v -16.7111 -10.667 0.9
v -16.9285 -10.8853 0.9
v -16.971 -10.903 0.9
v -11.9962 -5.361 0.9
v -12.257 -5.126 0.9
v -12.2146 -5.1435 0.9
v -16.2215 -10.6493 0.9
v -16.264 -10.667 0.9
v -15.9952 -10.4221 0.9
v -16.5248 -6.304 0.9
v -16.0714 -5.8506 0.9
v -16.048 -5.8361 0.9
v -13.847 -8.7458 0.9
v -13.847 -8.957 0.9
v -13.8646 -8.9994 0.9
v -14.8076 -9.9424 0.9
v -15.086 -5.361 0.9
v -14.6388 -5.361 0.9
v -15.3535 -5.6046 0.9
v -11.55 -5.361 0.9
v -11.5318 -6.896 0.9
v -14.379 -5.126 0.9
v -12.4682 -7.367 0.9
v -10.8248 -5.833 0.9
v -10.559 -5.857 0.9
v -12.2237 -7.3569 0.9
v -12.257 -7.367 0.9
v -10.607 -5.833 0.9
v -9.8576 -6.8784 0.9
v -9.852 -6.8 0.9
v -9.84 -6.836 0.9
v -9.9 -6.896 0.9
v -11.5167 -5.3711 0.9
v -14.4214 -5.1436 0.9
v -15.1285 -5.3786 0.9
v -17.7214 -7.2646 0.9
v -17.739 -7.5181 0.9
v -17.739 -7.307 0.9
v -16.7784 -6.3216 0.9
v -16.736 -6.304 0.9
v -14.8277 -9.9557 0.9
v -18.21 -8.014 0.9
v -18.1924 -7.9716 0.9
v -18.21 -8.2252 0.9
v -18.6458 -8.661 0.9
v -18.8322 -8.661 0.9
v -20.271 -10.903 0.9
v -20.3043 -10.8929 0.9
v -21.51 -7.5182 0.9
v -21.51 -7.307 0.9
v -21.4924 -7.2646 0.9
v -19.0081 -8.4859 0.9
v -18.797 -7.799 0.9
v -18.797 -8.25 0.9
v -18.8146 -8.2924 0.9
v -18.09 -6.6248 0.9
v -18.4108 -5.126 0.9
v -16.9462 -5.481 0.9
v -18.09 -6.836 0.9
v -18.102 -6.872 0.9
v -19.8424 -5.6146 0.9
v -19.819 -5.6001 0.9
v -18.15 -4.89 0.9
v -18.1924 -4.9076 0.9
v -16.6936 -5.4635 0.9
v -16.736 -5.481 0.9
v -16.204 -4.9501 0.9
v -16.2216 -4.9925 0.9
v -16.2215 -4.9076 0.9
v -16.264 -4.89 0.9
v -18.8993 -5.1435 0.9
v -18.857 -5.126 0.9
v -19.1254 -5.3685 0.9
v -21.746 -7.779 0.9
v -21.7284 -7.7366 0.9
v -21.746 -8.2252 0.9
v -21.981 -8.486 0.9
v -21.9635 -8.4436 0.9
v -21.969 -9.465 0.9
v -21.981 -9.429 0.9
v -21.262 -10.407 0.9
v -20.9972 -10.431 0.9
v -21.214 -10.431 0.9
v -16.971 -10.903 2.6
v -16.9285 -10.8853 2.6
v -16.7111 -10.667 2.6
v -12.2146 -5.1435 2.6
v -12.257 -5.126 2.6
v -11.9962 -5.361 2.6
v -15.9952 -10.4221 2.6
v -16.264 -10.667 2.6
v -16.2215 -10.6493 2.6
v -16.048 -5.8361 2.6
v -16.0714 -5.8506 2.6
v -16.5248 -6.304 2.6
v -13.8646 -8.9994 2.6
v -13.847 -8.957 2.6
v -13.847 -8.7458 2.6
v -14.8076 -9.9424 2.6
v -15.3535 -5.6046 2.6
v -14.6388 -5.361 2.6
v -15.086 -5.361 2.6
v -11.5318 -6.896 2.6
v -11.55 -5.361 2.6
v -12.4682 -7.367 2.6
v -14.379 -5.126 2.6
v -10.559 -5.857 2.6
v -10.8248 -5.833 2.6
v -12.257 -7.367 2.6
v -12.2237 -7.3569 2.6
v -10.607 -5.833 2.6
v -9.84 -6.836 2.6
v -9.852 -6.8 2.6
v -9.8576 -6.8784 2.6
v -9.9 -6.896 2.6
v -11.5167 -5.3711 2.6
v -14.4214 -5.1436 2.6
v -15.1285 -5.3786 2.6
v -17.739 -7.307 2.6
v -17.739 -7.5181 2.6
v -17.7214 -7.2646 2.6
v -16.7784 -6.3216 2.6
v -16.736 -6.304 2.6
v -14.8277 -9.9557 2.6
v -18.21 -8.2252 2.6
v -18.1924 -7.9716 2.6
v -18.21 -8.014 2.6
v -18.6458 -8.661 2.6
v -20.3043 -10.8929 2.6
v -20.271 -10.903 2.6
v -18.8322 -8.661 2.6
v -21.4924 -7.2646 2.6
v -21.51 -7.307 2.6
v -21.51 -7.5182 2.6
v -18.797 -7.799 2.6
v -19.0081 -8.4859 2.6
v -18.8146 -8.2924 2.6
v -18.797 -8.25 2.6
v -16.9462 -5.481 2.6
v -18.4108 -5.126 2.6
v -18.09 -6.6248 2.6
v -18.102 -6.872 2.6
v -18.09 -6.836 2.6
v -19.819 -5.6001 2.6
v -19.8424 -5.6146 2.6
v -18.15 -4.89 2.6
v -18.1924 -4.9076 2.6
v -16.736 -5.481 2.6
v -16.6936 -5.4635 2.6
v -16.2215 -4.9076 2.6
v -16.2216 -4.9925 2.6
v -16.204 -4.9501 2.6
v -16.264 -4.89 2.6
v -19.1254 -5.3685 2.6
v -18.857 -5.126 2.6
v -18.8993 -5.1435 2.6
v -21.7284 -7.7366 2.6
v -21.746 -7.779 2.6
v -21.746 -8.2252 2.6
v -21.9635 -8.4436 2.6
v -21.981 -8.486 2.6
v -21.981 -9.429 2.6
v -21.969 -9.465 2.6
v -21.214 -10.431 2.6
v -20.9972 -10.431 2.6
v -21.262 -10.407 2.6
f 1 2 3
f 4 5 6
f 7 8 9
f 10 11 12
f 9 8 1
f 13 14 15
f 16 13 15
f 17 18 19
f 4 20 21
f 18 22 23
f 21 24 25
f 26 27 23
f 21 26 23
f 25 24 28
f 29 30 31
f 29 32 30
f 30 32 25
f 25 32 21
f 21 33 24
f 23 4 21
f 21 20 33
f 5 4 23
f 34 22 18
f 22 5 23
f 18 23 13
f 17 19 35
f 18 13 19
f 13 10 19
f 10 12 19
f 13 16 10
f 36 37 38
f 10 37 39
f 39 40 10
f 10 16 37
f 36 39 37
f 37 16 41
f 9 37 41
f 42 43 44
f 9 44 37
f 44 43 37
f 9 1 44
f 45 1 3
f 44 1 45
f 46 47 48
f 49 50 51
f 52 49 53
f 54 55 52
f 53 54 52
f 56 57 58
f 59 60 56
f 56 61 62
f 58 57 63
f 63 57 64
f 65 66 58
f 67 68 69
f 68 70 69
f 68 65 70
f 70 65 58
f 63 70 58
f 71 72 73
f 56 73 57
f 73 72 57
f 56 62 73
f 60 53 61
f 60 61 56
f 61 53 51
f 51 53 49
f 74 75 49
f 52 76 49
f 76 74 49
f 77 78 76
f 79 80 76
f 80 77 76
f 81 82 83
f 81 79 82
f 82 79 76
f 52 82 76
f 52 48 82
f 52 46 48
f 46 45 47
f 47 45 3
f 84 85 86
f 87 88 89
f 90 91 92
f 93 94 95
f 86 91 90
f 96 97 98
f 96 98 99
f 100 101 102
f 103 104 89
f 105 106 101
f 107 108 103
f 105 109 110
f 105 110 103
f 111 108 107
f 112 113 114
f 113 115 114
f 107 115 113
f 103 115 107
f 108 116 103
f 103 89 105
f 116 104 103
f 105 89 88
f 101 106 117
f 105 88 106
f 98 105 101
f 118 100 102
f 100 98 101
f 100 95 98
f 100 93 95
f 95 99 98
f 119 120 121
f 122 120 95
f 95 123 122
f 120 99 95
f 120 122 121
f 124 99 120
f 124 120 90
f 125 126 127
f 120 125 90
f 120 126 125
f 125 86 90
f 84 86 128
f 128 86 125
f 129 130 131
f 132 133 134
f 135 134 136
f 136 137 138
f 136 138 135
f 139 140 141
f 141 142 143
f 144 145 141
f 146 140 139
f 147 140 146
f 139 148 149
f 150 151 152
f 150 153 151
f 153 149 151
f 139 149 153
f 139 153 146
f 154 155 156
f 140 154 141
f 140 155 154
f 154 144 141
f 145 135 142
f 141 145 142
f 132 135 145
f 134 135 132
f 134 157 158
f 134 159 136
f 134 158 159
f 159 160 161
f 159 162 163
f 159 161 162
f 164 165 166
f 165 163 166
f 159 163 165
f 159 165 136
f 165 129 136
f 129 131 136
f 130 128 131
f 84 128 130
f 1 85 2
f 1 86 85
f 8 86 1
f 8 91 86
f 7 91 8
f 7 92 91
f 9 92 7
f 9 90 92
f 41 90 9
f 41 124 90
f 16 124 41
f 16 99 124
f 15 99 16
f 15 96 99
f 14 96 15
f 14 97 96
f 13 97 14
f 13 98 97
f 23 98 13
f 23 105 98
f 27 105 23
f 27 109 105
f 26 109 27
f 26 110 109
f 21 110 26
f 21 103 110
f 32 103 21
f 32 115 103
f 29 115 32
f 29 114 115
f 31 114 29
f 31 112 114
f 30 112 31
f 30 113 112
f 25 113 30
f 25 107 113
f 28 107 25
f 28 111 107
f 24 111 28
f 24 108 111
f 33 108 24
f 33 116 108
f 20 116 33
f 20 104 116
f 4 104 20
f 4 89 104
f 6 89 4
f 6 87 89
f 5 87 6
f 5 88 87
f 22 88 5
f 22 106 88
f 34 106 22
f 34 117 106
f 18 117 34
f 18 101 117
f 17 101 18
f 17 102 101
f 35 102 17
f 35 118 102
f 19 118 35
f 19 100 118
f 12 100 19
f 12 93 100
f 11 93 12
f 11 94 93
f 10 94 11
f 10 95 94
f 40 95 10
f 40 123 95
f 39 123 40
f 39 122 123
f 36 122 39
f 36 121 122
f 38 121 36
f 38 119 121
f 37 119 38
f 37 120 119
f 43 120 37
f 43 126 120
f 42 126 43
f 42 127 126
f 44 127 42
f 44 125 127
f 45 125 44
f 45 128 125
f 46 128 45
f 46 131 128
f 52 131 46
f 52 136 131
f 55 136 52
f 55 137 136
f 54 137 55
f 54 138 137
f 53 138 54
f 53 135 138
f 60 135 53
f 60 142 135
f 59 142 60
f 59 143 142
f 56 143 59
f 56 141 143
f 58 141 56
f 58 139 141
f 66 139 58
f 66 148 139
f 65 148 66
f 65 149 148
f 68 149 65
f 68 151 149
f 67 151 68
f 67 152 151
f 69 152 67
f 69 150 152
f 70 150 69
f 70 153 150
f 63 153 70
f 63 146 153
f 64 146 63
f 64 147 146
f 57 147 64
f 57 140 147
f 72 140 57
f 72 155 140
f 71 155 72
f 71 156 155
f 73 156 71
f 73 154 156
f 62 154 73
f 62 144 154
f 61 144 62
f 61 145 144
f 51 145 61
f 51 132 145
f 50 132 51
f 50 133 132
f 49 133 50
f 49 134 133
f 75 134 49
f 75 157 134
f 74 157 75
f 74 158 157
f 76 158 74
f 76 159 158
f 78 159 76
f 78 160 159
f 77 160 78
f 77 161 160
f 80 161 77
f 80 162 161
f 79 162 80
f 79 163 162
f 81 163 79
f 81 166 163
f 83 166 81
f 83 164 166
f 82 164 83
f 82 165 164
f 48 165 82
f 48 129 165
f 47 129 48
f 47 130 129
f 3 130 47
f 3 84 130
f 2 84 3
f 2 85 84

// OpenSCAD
$fn = 24;
translate([0, 0.000, 0.900])
  linear_extrude(height=1.700) {
offset(r=0.06, $fn=8) {
    polygon(points=[[-21.921,-9.429],[-21.214,-10.371],[-20.979,-10.371],[-20.271,-10.843],[-16.971,-10.843],[-16.736,-10.607],[-16.264,-10.607],[-16.029,-10.371],[-14.850,-9.900],[-13.907,-8.957],[-13.907,-8.721],[-12.493,-7.307],[-12.257,-7.307],[-11.550,-6.836],[-9.900,-6.836],[-10.607,-5.893],[-10.843,-5.893],[-11.550,-5.421],[-12.021,-5.421],[-12.257,-5.186],[-14.379,-5.186],[-14.614,-5.421],[-15.086,-5.421],[-15.321,-5.657],[-16.029,-5.893],[-16.500,-6.364],[-16.736,-6.364],[-17.679,-7.307],[-17.679,-7.543],[-18.150,-8.014],[-18.150,-8.250],[-18.621,-8.721],[-18.857,-8.721],[-19.093,-8.486],[-18.857,-8.250],[-18.857,-7.779],[-18.150,-6.836],[-18.150,-6.600],[-16.971,-5.421],[-16.736,-5.421],[-16.264,-4.950],[-18.150,-4.950],[-18.386,-5.186],[-18.857,-5.186],[-19.093,-5.421],[-19.800,-5.657],[-21.450,-7.307],[-21.450,-7.543],[-21.686,-7.779],[-21.686,-8.250],[-21.921,-8.486]], paths=[[0,1,2,3,4,5,6,7,8,9,10,11,12,13,14,15,16,17,18,19,20,21,22,23,24,25,26,27,28,29,30,31,32,33,34,35,36,37,38,39,40,41,42,43,44,45,46,47,48,49,50]]);
}
}
